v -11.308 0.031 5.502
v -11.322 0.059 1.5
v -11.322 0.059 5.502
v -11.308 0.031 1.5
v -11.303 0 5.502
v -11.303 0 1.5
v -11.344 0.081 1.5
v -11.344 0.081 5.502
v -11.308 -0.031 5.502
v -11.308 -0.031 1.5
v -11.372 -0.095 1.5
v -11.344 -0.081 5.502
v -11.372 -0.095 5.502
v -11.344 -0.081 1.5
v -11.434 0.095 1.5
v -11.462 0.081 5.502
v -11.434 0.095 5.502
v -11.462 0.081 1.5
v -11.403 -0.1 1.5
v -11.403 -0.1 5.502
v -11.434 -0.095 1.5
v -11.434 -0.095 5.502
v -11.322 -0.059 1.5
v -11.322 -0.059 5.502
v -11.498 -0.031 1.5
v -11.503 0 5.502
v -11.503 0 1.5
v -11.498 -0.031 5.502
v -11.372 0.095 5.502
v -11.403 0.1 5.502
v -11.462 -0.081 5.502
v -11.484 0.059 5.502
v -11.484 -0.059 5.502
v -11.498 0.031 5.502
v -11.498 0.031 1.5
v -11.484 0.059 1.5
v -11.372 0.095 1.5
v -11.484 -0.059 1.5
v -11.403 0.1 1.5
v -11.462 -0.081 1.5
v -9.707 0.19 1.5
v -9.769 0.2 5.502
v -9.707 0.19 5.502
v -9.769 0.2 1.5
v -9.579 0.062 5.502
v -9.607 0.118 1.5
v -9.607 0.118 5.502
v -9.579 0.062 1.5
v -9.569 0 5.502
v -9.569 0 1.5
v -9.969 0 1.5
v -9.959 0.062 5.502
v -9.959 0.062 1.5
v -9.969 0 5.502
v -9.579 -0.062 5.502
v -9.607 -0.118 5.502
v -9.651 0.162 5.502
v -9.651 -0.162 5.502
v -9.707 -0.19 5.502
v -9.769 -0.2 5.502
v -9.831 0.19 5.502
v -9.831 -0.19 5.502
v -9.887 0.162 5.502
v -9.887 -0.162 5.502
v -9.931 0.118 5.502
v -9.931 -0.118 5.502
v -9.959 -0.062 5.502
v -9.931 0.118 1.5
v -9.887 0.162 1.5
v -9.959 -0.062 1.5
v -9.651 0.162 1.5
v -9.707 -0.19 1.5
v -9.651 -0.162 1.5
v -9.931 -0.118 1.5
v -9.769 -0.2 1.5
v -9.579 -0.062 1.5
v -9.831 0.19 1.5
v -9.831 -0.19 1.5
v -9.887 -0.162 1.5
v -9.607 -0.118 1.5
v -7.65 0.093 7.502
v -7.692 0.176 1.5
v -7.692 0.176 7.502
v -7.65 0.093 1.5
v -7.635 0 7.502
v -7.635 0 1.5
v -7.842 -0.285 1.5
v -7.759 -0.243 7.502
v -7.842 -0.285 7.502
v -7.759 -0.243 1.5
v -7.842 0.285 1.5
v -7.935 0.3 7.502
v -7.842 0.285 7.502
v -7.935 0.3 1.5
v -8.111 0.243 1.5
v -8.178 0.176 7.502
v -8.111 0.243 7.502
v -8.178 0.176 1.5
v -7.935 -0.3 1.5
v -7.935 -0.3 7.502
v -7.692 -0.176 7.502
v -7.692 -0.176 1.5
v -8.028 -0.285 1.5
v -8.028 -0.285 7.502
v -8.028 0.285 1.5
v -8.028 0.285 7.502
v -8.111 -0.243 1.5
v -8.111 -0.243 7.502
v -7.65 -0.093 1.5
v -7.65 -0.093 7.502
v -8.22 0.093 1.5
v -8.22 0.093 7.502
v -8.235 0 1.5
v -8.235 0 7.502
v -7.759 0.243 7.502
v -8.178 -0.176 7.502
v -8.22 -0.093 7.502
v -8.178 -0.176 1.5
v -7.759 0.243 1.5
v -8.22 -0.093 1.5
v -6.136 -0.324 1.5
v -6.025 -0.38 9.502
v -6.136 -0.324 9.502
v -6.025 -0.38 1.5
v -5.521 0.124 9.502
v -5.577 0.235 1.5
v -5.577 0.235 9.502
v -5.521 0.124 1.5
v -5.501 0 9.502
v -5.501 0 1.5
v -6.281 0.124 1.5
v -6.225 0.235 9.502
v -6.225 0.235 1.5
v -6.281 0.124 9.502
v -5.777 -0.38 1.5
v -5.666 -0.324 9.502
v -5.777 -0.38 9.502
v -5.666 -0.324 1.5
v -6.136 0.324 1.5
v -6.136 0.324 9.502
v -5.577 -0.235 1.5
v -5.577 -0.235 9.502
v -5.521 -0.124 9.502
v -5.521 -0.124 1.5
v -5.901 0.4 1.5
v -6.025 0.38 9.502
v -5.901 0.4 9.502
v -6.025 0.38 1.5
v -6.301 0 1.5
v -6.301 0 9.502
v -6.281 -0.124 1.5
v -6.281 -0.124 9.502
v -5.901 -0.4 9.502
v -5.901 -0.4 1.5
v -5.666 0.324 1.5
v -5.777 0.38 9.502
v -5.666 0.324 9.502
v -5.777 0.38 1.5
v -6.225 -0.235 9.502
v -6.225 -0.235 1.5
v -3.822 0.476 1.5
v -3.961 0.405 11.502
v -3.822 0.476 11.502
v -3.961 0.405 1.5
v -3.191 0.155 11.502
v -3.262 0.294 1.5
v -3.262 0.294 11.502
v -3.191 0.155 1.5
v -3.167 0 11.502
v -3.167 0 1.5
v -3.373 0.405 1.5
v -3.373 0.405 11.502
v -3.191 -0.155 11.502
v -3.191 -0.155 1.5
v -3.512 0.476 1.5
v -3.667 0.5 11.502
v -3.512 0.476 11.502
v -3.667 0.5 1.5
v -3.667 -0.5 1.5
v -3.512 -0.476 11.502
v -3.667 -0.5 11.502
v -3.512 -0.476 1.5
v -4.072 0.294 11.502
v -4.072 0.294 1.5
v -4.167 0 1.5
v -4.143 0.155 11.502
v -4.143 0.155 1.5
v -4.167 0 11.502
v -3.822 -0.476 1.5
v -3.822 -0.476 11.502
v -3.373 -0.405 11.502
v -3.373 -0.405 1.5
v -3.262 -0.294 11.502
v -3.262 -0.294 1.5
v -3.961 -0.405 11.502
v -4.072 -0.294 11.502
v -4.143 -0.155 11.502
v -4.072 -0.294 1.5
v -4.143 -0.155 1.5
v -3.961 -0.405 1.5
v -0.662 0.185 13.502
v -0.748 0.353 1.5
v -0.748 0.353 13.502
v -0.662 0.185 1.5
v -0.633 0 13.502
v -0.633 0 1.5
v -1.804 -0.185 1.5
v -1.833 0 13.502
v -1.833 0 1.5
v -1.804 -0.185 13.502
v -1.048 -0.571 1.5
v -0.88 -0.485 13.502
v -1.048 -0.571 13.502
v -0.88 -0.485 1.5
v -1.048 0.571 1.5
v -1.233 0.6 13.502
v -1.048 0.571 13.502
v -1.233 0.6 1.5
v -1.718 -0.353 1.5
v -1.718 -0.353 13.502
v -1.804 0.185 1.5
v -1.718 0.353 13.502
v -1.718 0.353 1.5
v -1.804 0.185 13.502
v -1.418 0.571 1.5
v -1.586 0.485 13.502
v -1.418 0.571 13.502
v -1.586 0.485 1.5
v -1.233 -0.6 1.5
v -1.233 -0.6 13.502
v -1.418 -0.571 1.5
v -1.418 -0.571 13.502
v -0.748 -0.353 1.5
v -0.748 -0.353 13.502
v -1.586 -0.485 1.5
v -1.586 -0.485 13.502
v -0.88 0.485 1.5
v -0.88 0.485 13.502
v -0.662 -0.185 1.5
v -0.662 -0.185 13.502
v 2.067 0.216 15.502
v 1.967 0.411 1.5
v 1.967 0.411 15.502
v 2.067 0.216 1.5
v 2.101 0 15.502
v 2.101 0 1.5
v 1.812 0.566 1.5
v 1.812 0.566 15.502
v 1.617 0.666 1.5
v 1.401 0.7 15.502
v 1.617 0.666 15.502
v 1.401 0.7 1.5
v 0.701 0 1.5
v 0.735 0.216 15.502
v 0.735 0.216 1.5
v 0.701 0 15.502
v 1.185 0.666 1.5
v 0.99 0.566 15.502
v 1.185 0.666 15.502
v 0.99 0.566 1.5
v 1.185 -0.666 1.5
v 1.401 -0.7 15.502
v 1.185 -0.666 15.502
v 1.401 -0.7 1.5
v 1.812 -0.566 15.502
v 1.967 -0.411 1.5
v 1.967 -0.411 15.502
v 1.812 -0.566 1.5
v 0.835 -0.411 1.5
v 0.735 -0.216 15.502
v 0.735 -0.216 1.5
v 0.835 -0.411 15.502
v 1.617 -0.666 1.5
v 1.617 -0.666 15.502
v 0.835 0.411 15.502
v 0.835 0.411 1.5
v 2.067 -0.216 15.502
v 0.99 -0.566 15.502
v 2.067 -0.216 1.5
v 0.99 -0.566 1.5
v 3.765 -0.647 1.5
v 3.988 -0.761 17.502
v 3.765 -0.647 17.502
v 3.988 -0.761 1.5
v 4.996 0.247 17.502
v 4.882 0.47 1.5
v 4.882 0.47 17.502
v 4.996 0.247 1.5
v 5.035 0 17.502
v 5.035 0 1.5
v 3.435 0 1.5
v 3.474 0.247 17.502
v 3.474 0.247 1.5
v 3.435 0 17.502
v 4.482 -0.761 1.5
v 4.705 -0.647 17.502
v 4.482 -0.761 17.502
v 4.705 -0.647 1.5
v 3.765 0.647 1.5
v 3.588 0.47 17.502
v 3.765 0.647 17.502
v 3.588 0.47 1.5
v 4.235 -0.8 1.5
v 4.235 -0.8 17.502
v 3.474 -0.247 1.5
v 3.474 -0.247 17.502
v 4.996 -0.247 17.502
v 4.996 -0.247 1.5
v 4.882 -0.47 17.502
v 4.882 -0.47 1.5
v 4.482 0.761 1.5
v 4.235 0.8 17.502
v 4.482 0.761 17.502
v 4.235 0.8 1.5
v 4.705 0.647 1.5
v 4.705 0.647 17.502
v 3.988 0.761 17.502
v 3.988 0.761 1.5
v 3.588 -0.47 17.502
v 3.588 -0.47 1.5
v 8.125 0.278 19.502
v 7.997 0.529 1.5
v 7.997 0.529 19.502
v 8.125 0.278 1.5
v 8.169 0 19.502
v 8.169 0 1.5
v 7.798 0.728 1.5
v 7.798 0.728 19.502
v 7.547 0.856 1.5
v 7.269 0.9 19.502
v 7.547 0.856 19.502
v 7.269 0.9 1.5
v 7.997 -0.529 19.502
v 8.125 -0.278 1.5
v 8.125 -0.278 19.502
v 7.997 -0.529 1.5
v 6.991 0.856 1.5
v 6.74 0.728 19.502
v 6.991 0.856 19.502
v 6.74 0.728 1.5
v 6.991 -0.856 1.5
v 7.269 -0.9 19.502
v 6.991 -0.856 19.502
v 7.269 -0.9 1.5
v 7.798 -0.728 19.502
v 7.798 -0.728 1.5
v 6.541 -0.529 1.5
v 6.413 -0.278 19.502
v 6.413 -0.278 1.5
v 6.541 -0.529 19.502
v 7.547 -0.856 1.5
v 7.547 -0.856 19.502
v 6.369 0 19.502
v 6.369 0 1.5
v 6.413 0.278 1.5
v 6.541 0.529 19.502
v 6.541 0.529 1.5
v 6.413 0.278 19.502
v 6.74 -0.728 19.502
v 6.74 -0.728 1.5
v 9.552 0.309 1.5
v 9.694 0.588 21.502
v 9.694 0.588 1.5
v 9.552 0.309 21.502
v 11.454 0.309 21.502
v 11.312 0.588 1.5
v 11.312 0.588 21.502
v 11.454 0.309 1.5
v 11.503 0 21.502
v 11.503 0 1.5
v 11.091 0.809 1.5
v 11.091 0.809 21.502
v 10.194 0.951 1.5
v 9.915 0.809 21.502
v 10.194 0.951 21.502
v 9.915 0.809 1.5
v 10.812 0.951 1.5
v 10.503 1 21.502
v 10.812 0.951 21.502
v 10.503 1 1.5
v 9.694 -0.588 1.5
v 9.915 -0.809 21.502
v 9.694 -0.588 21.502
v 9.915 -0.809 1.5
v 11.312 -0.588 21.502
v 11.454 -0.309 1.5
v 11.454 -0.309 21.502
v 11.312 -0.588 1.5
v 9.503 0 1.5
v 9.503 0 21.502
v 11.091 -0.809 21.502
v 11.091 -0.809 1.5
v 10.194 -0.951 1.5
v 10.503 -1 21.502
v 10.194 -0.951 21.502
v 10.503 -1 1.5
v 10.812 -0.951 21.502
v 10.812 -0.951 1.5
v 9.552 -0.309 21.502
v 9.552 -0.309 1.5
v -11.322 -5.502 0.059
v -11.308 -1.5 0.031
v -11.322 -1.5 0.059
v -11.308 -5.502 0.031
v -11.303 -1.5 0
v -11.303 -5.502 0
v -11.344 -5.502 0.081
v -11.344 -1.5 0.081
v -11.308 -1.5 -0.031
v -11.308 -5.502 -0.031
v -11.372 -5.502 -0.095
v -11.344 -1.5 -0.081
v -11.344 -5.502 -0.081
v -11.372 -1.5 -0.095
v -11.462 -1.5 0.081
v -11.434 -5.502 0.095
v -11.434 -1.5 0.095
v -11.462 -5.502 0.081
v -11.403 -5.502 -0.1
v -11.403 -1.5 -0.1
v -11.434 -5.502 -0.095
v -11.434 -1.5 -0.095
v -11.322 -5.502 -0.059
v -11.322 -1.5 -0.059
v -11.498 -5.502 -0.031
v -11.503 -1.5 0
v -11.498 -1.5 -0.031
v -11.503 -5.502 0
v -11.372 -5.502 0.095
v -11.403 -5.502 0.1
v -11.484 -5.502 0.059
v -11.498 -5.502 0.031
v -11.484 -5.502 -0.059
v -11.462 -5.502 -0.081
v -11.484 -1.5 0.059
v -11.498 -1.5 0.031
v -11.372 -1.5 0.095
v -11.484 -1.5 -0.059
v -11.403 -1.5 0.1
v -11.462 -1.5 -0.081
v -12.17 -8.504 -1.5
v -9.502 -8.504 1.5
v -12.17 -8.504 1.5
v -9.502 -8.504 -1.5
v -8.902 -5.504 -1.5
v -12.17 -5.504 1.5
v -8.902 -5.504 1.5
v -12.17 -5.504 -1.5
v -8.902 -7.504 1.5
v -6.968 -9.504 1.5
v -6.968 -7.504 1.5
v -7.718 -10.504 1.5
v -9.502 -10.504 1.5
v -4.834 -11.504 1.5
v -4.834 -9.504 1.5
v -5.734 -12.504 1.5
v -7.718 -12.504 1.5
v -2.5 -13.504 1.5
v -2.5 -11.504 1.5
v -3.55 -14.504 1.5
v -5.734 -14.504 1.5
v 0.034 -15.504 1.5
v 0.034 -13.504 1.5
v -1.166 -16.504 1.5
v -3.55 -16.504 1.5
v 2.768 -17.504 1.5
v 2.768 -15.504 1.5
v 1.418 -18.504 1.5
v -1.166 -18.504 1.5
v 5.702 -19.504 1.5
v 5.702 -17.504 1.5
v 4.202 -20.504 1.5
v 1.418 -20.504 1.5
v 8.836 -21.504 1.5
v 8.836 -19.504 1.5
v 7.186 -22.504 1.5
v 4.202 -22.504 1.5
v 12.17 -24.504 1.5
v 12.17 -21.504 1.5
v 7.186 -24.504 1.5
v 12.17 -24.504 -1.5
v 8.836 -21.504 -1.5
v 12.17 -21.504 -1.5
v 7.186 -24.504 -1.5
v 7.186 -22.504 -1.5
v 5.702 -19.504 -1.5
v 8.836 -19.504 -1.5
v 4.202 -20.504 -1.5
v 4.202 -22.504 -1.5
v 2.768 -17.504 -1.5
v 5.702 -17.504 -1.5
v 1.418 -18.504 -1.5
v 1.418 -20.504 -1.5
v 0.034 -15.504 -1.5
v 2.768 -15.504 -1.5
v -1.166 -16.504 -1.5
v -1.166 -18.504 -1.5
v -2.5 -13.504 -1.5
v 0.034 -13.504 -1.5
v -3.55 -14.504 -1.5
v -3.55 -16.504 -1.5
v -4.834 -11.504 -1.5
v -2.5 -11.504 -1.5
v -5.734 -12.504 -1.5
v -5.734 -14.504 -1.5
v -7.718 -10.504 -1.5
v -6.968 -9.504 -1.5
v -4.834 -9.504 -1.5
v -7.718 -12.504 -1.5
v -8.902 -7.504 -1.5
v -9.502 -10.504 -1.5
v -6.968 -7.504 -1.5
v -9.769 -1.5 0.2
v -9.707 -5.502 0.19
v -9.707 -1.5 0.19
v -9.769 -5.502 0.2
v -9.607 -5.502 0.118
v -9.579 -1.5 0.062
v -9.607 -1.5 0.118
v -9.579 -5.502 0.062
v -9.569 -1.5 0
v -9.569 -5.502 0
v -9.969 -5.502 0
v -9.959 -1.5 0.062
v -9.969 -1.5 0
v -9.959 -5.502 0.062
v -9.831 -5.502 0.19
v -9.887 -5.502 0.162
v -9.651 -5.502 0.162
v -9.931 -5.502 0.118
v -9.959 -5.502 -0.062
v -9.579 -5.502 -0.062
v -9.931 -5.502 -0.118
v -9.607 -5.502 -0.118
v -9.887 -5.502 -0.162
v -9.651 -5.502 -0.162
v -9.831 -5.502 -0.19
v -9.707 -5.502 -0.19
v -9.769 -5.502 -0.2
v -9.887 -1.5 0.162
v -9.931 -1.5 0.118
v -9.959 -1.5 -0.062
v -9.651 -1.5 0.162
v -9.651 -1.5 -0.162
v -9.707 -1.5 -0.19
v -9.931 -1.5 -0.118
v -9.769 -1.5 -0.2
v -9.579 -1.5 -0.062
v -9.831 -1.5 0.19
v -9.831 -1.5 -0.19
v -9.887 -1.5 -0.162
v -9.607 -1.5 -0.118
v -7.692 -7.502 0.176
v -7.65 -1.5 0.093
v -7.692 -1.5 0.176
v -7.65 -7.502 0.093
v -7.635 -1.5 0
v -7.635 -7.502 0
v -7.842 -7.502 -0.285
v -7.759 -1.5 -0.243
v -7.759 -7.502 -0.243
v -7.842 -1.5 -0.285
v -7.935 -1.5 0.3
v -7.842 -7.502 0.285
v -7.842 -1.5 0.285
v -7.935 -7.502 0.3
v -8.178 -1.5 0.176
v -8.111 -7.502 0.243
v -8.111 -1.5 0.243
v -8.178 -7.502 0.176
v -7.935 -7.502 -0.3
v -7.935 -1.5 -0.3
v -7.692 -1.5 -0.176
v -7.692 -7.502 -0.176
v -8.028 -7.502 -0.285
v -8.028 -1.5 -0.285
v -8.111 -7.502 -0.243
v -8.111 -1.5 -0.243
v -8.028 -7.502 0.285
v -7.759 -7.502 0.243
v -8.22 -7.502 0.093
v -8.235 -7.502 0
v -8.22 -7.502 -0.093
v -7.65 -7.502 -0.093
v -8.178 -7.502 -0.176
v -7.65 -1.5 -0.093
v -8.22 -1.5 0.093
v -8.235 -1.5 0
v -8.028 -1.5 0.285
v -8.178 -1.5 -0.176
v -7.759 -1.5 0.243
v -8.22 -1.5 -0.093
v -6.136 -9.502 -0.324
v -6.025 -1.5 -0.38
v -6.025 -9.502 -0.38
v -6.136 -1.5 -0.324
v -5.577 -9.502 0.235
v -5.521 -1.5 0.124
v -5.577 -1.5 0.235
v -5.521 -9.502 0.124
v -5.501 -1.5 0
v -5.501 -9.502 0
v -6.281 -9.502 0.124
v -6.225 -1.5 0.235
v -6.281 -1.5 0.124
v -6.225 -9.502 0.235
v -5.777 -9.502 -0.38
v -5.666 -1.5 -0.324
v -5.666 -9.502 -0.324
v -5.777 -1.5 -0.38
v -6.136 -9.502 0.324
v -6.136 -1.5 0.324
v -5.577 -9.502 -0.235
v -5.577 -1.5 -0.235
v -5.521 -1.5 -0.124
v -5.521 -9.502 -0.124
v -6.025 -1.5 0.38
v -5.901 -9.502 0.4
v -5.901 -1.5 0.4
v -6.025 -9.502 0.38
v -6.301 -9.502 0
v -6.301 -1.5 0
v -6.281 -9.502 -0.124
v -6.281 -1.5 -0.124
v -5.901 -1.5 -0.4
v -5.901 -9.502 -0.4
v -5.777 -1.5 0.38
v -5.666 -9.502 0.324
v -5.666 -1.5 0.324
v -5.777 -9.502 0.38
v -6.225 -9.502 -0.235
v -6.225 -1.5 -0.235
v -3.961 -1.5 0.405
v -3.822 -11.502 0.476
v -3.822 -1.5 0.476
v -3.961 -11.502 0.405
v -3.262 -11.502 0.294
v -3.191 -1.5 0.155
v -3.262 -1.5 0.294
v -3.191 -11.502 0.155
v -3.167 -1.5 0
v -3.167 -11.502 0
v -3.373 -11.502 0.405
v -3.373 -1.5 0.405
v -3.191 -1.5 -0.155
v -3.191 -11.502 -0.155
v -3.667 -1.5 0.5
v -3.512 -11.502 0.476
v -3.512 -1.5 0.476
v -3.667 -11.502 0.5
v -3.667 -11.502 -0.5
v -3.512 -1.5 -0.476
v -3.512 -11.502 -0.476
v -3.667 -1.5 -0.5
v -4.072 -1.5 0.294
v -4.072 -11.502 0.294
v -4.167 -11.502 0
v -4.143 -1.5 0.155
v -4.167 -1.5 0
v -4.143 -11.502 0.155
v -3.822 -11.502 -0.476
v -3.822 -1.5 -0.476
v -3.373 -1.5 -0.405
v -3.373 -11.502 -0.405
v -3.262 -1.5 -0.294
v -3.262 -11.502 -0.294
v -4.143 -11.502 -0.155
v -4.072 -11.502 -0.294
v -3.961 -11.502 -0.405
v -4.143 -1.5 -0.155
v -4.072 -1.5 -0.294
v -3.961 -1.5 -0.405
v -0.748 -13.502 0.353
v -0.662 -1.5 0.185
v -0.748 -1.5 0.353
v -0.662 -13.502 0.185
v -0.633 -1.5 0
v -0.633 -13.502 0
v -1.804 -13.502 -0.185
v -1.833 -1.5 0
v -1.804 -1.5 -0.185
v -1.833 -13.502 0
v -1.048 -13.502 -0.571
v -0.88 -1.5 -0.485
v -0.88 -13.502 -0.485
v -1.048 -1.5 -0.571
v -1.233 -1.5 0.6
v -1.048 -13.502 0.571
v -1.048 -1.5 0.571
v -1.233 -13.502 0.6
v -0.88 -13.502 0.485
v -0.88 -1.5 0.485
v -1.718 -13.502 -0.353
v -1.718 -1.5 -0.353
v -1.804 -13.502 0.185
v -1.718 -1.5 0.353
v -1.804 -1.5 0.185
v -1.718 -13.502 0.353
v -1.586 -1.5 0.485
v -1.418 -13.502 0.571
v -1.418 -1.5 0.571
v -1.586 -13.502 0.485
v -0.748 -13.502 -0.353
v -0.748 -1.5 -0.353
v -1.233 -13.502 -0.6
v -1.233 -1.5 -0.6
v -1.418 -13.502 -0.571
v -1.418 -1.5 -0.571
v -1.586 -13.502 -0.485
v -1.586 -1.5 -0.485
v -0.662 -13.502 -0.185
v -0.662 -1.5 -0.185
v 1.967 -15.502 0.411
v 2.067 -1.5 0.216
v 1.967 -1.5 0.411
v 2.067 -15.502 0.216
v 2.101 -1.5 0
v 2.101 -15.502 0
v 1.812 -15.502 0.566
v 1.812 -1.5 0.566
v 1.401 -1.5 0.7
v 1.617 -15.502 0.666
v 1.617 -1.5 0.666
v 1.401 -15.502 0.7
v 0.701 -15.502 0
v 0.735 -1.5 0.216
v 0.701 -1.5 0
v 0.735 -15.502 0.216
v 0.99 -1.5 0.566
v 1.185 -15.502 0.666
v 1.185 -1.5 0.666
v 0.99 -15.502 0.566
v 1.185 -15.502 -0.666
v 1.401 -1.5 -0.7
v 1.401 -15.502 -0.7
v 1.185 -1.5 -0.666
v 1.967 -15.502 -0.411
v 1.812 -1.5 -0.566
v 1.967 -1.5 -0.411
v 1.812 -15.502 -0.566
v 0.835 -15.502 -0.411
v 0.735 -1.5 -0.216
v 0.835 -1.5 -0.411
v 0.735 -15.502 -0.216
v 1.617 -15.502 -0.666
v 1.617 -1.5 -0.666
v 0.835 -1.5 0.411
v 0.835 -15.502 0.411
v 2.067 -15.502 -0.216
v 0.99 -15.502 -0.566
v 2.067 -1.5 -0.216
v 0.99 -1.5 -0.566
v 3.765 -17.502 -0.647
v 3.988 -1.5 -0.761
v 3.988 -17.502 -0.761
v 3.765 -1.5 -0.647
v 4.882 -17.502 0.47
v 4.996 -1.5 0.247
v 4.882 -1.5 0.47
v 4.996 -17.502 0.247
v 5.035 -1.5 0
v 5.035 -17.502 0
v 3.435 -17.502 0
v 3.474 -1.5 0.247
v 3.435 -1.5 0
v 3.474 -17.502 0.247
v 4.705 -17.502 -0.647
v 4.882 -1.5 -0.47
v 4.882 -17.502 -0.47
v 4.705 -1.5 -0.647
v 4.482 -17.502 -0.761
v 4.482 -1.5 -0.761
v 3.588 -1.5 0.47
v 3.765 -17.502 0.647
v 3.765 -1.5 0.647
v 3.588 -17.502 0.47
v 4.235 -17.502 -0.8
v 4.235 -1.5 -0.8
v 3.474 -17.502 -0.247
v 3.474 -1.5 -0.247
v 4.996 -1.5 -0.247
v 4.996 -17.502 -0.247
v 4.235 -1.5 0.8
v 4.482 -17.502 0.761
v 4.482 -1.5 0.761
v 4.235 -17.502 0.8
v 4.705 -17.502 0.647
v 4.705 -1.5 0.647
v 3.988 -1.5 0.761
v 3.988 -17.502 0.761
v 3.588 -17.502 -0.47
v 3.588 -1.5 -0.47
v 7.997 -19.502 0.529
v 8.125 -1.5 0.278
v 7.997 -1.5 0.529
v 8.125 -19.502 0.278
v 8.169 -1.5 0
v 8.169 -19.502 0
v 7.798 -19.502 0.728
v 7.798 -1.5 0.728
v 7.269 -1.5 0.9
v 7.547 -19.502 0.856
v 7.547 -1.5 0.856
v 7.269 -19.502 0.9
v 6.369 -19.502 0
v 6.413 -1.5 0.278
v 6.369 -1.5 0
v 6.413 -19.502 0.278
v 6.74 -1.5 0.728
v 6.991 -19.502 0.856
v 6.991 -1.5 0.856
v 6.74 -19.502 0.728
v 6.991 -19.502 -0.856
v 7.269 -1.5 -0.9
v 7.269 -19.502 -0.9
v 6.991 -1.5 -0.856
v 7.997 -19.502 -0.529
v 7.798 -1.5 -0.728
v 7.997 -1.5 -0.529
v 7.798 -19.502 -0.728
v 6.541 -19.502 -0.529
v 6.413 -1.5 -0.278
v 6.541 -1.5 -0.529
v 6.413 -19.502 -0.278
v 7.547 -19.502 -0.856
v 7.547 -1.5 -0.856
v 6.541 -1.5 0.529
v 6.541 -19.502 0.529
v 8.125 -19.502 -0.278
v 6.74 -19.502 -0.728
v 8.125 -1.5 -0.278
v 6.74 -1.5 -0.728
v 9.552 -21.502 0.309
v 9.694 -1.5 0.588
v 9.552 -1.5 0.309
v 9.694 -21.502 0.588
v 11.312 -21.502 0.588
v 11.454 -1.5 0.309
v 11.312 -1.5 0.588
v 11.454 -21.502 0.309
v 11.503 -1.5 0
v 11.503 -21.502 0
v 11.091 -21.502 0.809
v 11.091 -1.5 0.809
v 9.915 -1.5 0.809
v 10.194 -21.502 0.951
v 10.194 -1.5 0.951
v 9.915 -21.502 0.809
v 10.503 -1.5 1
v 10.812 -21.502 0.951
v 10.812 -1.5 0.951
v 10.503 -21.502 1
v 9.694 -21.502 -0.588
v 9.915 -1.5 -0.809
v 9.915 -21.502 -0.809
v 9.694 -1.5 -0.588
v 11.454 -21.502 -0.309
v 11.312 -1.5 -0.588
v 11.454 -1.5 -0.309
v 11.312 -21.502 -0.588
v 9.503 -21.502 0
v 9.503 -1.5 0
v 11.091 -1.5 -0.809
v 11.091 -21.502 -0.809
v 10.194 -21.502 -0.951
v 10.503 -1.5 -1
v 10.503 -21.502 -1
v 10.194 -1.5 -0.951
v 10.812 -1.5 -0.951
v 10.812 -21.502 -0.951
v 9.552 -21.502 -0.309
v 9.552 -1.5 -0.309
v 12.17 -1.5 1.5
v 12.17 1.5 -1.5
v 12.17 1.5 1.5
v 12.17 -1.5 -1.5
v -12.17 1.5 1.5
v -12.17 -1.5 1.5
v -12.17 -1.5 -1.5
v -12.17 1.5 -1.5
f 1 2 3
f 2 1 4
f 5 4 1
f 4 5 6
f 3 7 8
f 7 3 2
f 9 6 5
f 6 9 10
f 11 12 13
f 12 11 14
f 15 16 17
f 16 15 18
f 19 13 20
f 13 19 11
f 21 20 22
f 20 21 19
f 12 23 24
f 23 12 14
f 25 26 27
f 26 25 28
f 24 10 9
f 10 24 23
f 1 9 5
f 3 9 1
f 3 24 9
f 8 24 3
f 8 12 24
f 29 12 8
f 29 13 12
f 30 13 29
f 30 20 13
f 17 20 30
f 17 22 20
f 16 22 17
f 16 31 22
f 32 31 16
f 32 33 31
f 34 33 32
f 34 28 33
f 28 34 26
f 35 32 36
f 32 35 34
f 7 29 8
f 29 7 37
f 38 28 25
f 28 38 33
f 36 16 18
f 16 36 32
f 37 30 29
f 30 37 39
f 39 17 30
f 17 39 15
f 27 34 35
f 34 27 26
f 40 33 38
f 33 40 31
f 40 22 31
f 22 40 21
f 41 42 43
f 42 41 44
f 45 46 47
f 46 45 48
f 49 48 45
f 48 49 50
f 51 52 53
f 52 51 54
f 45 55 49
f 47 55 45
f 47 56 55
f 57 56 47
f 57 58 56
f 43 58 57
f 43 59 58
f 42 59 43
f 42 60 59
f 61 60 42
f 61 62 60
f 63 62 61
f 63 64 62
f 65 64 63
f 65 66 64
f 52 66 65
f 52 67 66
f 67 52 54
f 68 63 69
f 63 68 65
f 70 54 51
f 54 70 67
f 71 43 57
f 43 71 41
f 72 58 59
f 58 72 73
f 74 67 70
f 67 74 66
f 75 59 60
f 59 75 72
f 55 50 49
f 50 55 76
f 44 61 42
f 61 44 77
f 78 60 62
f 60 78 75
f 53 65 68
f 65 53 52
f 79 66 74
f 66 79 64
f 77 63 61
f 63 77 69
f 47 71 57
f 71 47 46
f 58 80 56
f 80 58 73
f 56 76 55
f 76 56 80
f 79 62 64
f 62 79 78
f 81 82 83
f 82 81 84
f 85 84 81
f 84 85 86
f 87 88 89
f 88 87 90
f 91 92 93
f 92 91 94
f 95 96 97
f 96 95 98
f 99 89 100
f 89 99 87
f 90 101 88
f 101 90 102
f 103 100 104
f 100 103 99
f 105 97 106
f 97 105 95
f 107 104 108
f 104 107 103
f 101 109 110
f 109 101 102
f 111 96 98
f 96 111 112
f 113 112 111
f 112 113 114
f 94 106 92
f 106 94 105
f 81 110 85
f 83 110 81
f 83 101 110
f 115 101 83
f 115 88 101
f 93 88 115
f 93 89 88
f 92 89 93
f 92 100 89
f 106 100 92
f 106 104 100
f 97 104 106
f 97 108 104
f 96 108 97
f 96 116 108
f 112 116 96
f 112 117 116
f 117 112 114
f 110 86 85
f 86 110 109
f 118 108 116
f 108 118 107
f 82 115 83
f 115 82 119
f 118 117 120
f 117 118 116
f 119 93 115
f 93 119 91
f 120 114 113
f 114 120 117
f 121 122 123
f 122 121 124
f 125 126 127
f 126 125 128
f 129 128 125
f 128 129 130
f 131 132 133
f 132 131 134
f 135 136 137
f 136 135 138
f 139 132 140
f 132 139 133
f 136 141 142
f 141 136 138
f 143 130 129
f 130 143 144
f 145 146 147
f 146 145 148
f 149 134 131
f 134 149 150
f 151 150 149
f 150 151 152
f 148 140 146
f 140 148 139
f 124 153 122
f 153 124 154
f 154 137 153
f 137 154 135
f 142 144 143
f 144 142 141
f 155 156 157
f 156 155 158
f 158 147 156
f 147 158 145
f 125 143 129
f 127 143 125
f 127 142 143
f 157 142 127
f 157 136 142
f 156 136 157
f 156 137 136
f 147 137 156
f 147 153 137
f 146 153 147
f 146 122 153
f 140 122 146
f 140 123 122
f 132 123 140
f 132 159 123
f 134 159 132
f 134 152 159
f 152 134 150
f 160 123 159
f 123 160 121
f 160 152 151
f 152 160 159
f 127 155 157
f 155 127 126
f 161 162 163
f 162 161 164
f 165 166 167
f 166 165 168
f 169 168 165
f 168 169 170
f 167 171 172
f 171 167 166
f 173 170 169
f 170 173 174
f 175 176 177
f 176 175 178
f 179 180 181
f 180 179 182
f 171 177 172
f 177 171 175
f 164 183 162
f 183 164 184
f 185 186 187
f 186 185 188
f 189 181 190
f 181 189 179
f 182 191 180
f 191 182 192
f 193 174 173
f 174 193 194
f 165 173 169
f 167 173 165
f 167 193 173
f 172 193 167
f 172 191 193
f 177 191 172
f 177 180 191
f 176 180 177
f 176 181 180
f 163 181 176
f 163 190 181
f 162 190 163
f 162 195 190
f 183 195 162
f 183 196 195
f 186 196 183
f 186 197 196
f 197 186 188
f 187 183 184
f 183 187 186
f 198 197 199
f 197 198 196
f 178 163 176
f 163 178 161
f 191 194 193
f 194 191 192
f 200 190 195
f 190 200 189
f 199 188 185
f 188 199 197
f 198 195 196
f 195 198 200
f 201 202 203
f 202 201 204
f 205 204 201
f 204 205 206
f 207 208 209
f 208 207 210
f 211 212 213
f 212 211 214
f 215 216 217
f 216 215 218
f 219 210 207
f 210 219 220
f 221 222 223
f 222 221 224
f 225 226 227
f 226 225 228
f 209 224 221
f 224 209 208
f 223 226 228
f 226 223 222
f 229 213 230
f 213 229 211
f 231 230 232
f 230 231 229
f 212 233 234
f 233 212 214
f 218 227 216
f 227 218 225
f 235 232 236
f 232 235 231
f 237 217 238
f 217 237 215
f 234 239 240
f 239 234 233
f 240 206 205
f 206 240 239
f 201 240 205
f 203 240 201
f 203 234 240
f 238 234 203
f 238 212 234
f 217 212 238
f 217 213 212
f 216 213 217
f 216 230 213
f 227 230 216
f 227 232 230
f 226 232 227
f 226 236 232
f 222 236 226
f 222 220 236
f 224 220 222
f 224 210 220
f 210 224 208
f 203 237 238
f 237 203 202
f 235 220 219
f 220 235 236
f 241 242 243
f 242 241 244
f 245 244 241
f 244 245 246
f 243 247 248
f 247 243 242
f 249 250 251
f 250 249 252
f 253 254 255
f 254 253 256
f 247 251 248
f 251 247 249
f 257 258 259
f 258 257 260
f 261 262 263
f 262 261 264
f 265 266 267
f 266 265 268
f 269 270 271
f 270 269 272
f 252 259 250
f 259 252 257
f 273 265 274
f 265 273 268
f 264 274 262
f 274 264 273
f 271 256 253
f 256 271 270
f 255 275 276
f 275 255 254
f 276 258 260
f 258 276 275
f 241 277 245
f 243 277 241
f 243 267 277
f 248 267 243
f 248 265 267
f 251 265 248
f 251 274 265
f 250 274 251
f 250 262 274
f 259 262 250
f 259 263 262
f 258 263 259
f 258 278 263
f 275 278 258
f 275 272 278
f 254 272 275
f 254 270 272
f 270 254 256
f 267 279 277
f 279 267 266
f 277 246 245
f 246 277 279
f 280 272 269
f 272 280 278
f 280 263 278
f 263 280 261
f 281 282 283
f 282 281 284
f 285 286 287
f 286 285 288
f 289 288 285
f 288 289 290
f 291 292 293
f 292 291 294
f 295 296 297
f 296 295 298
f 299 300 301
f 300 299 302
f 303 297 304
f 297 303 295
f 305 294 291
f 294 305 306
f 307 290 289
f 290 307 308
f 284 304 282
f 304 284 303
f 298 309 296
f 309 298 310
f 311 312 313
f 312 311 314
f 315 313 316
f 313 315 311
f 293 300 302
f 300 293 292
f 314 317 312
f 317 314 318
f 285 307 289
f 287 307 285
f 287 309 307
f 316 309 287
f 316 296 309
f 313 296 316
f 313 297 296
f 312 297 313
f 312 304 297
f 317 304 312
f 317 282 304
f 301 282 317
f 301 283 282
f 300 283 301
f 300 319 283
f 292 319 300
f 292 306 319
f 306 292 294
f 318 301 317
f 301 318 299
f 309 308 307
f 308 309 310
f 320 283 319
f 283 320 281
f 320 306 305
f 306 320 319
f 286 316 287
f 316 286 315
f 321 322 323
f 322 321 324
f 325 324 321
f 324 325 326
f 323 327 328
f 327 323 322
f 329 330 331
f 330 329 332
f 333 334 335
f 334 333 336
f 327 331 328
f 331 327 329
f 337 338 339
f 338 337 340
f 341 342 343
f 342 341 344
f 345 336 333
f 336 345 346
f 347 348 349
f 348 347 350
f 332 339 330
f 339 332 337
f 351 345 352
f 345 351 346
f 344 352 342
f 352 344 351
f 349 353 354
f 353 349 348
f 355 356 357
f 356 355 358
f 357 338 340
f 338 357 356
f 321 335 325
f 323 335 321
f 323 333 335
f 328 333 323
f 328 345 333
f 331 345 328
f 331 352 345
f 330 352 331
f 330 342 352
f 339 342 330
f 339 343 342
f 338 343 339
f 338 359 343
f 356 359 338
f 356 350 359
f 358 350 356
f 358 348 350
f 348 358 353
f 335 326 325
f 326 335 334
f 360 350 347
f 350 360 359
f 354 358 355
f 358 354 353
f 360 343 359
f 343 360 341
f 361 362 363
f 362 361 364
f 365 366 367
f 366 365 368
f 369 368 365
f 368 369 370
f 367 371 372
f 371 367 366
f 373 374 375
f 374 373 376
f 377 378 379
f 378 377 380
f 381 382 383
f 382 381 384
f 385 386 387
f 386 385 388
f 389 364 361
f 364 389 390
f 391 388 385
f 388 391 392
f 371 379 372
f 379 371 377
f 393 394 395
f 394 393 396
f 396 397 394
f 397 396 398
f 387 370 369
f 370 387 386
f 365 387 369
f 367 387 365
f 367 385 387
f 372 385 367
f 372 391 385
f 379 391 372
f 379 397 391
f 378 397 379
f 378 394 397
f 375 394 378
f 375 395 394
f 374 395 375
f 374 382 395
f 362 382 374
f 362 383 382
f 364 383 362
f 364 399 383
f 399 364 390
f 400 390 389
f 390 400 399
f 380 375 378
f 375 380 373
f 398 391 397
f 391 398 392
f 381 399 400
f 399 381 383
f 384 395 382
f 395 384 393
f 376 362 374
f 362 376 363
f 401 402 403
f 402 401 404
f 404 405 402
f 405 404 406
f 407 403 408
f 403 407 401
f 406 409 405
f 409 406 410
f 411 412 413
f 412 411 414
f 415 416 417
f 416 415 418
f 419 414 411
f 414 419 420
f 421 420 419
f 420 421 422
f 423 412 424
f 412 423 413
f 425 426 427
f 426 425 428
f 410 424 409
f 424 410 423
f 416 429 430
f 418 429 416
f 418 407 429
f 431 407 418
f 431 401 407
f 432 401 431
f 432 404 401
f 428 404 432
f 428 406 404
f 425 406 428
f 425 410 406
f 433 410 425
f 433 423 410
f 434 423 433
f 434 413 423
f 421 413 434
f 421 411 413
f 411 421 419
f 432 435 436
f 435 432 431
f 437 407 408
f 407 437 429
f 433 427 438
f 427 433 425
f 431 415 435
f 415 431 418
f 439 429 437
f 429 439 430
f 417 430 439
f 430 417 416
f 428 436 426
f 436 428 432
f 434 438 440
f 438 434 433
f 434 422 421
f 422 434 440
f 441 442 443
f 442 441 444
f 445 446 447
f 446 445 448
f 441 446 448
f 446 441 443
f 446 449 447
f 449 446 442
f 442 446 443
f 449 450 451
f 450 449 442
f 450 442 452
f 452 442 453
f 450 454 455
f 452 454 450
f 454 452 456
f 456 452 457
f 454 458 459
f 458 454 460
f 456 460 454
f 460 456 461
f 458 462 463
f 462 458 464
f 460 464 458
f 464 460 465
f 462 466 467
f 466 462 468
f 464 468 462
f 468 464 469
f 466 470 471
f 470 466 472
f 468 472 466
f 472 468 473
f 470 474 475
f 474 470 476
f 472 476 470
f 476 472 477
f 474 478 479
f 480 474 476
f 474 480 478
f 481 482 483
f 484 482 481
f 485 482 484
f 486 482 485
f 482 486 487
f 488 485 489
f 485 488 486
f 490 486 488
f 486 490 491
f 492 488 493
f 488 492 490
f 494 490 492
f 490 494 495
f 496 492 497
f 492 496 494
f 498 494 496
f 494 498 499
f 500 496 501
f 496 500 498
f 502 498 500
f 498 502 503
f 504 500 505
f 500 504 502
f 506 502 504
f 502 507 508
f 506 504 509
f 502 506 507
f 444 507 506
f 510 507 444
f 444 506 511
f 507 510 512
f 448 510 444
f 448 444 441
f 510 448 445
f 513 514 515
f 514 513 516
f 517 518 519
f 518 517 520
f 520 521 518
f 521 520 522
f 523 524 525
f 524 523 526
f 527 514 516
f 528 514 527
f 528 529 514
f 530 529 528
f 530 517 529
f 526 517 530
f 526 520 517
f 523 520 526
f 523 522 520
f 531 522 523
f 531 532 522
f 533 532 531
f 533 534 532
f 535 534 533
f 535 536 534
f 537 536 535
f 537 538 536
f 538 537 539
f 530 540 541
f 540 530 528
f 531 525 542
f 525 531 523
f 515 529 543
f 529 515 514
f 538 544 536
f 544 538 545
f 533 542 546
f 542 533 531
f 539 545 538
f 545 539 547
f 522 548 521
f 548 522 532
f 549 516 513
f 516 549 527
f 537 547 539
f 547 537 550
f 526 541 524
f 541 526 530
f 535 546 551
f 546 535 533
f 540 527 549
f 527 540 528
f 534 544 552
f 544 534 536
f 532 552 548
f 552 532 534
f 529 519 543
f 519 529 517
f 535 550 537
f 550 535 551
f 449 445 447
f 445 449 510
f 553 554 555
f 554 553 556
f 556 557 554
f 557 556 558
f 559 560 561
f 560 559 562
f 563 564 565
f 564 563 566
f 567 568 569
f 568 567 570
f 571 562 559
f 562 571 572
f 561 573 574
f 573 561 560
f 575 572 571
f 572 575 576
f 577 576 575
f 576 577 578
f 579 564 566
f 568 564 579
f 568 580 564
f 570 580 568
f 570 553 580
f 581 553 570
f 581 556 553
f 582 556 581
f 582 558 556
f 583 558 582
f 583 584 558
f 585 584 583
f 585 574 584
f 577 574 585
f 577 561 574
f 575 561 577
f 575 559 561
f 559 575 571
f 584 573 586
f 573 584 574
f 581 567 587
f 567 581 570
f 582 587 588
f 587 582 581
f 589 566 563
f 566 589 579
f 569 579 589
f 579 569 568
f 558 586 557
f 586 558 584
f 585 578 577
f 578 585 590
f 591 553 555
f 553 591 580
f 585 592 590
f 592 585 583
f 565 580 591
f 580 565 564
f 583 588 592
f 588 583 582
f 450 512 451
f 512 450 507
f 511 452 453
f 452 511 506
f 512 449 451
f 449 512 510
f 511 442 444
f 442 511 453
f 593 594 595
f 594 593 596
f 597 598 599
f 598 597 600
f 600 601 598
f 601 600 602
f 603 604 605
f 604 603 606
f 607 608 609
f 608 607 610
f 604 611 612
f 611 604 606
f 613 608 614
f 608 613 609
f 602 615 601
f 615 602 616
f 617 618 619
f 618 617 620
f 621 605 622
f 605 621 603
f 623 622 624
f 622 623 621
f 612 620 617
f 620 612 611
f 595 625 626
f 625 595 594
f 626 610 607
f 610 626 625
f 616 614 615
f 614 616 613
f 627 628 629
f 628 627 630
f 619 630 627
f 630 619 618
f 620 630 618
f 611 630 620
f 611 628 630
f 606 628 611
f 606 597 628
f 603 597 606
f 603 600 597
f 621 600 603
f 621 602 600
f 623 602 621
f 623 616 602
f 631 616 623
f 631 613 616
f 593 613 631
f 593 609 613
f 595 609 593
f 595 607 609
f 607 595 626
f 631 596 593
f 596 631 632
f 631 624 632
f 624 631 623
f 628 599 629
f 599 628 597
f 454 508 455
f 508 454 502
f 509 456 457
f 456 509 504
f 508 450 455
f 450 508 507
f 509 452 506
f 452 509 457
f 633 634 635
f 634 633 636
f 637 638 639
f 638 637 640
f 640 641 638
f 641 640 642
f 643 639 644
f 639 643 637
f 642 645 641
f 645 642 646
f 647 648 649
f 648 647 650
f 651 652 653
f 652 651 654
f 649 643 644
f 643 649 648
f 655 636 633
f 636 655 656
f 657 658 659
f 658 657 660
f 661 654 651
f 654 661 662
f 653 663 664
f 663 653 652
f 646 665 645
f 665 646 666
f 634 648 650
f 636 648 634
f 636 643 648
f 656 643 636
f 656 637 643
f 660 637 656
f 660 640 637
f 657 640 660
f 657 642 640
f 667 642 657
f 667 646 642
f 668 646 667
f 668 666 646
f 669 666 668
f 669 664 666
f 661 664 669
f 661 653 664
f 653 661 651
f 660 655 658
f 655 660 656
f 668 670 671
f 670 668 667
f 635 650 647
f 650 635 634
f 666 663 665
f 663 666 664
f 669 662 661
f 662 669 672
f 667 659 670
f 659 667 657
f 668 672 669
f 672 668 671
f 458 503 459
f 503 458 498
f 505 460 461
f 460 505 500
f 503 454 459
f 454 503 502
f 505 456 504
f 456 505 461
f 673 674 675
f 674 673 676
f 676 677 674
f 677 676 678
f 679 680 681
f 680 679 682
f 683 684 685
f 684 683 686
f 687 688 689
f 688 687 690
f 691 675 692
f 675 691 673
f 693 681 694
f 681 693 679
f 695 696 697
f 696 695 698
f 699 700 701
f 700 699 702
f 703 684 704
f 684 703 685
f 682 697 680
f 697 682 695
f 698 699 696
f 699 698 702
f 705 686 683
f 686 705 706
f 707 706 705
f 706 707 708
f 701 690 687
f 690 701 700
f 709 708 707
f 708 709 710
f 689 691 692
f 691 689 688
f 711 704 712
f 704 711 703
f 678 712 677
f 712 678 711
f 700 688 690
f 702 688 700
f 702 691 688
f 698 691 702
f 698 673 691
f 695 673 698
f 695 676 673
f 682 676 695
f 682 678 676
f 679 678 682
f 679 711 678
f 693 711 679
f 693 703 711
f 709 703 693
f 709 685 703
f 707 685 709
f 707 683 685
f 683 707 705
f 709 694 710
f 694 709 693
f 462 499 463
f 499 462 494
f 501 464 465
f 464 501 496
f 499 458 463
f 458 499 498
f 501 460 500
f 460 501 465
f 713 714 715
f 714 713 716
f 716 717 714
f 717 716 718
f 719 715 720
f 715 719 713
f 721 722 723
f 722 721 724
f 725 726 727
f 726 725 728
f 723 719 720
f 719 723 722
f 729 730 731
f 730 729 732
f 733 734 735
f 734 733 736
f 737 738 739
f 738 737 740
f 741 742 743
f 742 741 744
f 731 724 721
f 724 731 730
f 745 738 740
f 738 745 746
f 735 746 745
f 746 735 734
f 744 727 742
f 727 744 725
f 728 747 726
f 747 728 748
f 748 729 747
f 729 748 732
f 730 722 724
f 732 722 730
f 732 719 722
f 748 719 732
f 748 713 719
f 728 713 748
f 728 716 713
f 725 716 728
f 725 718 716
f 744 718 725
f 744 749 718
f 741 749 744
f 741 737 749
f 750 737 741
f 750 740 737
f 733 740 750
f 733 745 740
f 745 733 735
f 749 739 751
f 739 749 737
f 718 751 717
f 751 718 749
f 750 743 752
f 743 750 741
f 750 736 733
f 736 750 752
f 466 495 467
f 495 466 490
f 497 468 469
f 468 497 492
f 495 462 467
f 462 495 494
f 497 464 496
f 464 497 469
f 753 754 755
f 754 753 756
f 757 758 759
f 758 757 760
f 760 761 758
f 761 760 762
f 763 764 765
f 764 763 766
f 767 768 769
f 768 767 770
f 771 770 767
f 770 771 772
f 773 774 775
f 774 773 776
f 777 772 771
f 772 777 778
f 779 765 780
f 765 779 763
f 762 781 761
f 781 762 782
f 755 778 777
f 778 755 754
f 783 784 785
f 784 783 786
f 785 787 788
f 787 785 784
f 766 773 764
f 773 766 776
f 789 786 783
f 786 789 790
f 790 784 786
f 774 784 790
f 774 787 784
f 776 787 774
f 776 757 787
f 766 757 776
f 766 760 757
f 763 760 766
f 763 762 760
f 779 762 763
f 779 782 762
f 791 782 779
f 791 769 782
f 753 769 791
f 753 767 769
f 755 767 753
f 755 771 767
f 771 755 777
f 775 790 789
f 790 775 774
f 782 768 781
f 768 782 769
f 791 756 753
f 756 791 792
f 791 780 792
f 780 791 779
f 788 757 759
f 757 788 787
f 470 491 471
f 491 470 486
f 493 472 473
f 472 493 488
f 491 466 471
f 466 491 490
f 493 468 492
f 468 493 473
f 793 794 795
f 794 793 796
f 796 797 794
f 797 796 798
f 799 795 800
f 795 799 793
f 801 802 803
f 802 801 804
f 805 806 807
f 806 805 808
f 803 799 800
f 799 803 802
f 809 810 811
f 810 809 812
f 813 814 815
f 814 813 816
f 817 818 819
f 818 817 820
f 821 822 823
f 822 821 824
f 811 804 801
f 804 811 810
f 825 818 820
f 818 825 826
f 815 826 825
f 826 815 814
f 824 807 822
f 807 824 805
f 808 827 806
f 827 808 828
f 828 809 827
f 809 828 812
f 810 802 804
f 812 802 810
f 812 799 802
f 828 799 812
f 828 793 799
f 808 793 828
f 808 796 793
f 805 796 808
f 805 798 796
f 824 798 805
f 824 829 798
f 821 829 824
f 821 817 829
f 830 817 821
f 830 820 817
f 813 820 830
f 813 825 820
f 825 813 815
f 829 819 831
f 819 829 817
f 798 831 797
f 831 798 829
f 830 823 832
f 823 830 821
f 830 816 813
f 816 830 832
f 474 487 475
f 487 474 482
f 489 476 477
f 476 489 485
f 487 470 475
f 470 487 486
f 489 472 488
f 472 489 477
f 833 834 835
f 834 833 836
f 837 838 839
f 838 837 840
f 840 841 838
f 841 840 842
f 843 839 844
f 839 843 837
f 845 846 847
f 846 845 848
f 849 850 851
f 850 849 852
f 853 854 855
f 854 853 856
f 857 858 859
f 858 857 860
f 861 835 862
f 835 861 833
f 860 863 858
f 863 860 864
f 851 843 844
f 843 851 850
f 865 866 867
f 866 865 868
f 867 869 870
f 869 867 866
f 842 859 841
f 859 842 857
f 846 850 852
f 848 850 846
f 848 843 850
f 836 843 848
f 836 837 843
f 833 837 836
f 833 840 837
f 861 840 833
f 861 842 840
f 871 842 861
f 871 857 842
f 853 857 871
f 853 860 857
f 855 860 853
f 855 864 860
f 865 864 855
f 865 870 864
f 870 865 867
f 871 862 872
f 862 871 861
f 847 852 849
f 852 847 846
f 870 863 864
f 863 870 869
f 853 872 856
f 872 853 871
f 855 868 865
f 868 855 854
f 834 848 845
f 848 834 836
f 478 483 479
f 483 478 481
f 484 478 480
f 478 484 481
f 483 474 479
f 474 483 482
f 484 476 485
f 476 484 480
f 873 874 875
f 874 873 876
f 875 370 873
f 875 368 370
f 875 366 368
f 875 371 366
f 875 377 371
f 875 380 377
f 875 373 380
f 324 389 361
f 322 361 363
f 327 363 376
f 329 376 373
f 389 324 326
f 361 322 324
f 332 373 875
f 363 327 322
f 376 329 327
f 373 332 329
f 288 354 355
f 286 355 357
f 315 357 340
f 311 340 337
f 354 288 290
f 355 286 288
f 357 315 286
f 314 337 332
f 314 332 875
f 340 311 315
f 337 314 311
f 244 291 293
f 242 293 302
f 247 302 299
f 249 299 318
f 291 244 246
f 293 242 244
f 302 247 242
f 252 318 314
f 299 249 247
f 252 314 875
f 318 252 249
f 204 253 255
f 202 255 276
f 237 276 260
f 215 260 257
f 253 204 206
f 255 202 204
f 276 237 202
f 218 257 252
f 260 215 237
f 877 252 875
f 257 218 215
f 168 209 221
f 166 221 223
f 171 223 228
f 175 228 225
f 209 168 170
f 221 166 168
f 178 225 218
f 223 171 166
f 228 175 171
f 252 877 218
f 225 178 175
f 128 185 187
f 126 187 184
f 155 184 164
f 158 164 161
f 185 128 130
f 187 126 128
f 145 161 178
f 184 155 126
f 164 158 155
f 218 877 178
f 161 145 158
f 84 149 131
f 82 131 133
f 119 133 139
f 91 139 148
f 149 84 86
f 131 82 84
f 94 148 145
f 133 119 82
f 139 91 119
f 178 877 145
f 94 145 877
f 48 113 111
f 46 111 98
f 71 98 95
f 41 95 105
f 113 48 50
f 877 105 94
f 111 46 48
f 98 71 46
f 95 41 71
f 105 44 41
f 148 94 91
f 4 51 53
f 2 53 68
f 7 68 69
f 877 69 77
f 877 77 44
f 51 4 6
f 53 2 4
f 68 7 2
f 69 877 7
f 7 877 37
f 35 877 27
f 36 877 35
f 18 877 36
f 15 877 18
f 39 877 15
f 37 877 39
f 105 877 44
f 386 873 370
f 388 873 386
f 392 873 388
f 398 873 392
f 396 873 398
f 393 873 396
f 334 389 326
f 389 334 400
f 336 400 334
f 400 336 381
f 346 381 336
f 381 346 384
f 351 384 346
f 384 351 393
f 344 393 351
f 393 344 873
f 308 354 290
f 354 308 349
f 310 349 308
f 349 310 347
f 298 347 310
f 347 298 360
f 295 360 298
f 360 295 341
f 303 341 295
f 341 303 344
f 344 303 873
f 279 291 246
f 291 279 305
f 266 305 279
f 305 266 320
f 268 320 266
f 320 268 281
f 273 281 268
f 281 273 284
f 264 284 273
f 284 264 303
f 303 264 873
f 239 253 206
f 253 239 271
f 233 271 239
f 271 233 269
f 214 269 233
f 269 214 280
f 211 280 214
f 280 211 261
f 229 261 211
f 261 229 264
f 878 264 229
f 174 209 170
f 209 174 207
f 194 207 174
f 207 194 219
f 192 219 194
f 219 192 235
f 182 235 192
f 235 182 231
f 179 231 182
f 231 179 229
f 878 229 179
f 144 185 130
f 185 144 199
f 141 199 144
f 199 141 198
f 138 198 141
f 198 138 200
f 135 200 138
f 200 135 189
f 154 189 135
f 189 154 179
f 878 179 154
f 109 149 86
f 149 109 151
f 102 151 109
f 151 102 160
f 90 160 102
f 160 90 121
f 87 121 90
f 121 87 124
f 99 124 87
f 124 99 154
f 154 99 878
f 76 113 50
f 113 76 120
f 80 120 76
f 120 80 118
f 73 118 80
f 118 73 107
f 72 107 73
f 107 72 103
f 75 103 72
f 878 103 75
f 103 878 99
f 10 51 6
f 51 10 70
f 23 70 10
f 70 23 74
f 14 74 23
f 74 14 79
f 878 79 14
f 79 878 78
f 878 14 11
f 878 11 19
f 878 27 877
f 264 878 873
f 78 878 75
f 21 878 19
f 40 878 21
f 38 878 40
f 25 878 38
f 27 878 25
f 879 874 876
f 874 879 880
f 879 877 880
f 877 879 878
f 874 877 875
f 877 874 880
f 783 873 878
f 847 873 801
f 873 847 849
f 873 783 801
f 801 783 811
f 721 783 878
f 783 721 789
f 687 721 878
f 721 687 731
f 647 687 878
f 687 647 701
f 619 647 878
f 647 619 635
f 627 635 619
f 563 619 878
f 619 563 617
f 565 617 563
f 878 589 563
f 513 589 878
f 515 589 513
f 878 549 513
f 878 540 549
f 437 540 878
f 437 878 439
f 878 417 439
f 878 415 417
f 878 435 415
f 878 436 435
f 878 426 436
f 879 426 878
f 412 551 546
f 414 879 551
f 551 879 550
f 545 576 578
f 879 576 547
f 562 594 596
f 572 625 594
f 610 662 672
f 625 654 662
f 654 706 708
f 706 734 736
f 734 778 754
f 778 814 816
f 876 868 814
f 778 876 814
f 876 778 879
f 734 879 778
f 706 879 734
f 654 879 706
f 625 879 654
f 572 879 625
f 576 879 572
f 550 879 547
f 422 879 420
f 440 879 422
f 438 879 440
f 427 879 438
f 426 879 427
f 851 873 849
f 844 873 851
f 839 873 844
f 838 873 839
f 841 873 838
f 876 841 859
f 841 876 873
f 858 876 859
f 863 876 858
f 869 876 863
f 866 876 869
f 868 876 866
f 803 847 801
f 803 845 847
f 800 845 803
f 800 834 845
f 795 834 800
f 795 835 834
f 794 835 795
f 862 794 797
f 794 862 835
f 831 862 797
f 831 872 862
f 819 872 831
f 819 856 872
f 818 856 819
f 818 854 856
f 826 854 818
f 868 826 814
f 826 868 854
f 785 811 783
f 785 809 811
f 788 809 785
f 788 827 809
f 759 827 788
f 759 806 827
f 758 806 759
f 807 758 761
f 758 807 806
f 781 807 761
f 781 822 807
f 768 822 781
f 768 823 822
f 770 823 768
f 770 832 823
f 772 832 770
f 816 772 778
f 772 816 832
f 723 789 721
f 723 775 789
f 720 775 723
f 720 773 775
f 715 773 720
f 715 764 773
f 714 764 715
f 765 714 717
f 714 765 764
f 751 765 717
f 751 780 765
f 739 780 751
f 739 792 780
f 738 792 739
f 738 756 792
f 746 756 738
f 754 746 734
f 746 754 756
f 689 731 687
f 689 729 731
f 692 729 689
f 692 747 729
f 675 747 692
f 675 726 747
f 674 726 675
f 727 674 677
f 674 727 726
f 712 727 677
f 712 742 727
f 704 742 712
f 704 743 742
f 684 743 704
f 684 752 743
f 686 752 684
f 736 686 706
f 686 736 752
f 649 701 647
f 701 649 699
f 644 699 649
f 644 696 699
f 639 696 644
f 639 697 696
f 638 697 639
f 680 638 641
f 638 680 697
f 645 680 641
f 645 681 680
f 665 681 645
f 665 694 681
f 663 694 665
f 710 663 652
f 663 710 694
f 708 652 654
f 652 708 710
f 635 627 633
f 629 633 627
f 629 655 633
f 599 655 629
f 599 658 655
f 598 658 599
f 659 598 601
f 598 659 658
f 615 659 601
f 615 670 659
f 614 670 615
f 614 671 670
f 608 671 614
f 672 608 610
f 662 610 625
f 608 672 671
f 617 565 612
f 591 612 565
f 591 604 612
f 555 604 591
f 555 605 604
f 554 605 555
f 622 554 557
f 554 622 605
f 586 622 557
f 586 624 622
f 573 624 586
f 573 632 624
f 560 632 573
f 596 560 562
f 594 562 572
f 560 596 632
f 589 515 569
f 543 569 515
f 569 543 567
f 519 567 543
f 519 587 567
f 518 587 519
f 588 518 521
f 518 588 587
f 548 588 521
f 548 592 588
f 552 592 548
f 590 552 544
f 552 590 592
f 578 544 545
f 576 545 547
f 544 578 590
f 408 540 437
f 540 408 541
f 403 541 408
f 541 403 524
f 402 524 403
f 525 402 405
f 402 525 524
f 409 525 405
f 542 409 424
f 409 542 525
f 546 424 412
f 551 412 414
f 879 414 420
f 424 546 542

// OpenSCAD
// Cylindrical test feature object for Minimum Printable Feature Size determination
// Ben Weiss, 2015

pillarAspect = 10;
pillarCount = 10;
minPillarDiaH = .2; //mm
maxPillarDiaH = 2;
minPillarDiaV = 0.2; //mm
maxPillarDiaV = 2;
outrigger = true;
horiz_aspect = true;
skipH = 0;      // set to non-zero to skip rendering the first <skipH> bars
skipV = 0;      // set to non-zero to skip rendering the first <skipV> columns 

// quality settings. Since we don't control the scale, force the use of
// a reasonable number of fragments regardless of size.
//$fa = 10; // 5 degrees/fragment minimum
//$fs = 0.003; // minimum size of fragments, in mm
$fn = 20;

// derived quantities
maxPillarDia = max(maxPillarDiaH, maxPillarDiaV);
coreWidth = maxPillarDia * 1.5;
// coreLength ensures the gap between each pillar is at least 2/3 of either max pillar.
coreLength = max(((minPillarDiaH + maxPillarDiaH) / 2 + maxPillarDia * 0.667) * pillarCount,
                 ((minPillarDiaV + maxPillarDiaV) / 2 + maxPillarDia * 0.667) * pillarCount);
pillarLengthH = pillarAspect * maxPillarDiaH;
pillarStartHV = coreWidth / 2;
pillarEndH = pillarStartHV + pillarLengthH;
pillarSpacing = coreLength / pillarCount;

color([125/255, 156/255, 159/255, 1])
{
union()
{
    
    // Build the core
    cube(size=[coreLength, coreWidth, coreWidth], center=true);
    
    // Build the outrigger
    //translate([0, -(pillarEndH + coreWidth / 2)])
    //    cube(size=[coreLength, coreWidth, coreWidth], center=true);
    
    // vertical pillars
    pillars(minPillarDiaV, maxPillarDiaV, pillarAspect, maxPillarDiaH * 2, false, skipV);
    
    // horizontal pillars
    rotate([90,0,0])
        if(horiz_aspect)
            pillars(minPillarDiaH, maxPillarDiaH, pillarAspect, maxPillarDiaV * 2, outrigger, skipH);
        else
            pillars(minPillarDiaH, maxPillarDiaH, 0, pillarLengthH, outrigger, skipH);
}
}

// Creates vertical pillars; used to make each set of pillars in turn.
// @minDia, @maxDia - minimum and maximum pillar diameters.
// Pillars will have length (height) which is the greater of
// @minLength and @aspect * diameter
// uses global variables pillarCount, pillarFirstX, pillarSpacing
// pillarStartYZ, and coreWidth
// if @outrigger is true, also build an outrigger at the end of the pillars.
// if @skipFirst > 0, the first @skipFirst elements are not generated (this is used for figure generation)
module pillars(minDia, maxDia, aspect, minLength, outrigger=false, skipFirst=0)
{
    gap =(coreLength - 0.5 * (maxDia + minDia) * pillarCount) / ( pillarCount + 0);
    fudge = minDia * 0.02;    // this is enough extra height to fully intersect base/outrigger.
    diaStep = (maxDia - minDia) / (pillarCount - 1);
    pillarFirstX = -coreLength / 2 + gap / 2 + minDia / 2;
    union()
    {
        
        // Build each vertical pillar
        for(i=[0:pillarCount-1])
        {
            // per-pillar variables
            assign(dia = minDia + i * diaStep)
            {
            assign(cx = pillarFirstX + i * 0.5 * (dia + minDia) + i * gap,              h = max(aspect*dia, minLength) + fudge,
                  out_width = dia + gap + (dia + diaStep) * 0.75 * sign(i),              out_height = max(diaStep * aspect * 1.5, coreWidth))
            {
                if(i >= skipFirst)
                {
                    translate([cx, 0, pillarStartHV - fudge / 2])
                        cylinder(h=h, d=dia);
                }
            
                if(outrigger)
                {
                    // sign(i) lets us have different behavior on the first (smallest)
                    // entry so it doesn't overhang awkwardly.
                    translate([cx + dia / 2 + gap / 2 - out_width / 2, 0, pillarStartHV + h + out_height / 2])
                        cube(size=[out_width, coreWidth, out_height], center=true);
                }
            }
            }
        }
    }
}
